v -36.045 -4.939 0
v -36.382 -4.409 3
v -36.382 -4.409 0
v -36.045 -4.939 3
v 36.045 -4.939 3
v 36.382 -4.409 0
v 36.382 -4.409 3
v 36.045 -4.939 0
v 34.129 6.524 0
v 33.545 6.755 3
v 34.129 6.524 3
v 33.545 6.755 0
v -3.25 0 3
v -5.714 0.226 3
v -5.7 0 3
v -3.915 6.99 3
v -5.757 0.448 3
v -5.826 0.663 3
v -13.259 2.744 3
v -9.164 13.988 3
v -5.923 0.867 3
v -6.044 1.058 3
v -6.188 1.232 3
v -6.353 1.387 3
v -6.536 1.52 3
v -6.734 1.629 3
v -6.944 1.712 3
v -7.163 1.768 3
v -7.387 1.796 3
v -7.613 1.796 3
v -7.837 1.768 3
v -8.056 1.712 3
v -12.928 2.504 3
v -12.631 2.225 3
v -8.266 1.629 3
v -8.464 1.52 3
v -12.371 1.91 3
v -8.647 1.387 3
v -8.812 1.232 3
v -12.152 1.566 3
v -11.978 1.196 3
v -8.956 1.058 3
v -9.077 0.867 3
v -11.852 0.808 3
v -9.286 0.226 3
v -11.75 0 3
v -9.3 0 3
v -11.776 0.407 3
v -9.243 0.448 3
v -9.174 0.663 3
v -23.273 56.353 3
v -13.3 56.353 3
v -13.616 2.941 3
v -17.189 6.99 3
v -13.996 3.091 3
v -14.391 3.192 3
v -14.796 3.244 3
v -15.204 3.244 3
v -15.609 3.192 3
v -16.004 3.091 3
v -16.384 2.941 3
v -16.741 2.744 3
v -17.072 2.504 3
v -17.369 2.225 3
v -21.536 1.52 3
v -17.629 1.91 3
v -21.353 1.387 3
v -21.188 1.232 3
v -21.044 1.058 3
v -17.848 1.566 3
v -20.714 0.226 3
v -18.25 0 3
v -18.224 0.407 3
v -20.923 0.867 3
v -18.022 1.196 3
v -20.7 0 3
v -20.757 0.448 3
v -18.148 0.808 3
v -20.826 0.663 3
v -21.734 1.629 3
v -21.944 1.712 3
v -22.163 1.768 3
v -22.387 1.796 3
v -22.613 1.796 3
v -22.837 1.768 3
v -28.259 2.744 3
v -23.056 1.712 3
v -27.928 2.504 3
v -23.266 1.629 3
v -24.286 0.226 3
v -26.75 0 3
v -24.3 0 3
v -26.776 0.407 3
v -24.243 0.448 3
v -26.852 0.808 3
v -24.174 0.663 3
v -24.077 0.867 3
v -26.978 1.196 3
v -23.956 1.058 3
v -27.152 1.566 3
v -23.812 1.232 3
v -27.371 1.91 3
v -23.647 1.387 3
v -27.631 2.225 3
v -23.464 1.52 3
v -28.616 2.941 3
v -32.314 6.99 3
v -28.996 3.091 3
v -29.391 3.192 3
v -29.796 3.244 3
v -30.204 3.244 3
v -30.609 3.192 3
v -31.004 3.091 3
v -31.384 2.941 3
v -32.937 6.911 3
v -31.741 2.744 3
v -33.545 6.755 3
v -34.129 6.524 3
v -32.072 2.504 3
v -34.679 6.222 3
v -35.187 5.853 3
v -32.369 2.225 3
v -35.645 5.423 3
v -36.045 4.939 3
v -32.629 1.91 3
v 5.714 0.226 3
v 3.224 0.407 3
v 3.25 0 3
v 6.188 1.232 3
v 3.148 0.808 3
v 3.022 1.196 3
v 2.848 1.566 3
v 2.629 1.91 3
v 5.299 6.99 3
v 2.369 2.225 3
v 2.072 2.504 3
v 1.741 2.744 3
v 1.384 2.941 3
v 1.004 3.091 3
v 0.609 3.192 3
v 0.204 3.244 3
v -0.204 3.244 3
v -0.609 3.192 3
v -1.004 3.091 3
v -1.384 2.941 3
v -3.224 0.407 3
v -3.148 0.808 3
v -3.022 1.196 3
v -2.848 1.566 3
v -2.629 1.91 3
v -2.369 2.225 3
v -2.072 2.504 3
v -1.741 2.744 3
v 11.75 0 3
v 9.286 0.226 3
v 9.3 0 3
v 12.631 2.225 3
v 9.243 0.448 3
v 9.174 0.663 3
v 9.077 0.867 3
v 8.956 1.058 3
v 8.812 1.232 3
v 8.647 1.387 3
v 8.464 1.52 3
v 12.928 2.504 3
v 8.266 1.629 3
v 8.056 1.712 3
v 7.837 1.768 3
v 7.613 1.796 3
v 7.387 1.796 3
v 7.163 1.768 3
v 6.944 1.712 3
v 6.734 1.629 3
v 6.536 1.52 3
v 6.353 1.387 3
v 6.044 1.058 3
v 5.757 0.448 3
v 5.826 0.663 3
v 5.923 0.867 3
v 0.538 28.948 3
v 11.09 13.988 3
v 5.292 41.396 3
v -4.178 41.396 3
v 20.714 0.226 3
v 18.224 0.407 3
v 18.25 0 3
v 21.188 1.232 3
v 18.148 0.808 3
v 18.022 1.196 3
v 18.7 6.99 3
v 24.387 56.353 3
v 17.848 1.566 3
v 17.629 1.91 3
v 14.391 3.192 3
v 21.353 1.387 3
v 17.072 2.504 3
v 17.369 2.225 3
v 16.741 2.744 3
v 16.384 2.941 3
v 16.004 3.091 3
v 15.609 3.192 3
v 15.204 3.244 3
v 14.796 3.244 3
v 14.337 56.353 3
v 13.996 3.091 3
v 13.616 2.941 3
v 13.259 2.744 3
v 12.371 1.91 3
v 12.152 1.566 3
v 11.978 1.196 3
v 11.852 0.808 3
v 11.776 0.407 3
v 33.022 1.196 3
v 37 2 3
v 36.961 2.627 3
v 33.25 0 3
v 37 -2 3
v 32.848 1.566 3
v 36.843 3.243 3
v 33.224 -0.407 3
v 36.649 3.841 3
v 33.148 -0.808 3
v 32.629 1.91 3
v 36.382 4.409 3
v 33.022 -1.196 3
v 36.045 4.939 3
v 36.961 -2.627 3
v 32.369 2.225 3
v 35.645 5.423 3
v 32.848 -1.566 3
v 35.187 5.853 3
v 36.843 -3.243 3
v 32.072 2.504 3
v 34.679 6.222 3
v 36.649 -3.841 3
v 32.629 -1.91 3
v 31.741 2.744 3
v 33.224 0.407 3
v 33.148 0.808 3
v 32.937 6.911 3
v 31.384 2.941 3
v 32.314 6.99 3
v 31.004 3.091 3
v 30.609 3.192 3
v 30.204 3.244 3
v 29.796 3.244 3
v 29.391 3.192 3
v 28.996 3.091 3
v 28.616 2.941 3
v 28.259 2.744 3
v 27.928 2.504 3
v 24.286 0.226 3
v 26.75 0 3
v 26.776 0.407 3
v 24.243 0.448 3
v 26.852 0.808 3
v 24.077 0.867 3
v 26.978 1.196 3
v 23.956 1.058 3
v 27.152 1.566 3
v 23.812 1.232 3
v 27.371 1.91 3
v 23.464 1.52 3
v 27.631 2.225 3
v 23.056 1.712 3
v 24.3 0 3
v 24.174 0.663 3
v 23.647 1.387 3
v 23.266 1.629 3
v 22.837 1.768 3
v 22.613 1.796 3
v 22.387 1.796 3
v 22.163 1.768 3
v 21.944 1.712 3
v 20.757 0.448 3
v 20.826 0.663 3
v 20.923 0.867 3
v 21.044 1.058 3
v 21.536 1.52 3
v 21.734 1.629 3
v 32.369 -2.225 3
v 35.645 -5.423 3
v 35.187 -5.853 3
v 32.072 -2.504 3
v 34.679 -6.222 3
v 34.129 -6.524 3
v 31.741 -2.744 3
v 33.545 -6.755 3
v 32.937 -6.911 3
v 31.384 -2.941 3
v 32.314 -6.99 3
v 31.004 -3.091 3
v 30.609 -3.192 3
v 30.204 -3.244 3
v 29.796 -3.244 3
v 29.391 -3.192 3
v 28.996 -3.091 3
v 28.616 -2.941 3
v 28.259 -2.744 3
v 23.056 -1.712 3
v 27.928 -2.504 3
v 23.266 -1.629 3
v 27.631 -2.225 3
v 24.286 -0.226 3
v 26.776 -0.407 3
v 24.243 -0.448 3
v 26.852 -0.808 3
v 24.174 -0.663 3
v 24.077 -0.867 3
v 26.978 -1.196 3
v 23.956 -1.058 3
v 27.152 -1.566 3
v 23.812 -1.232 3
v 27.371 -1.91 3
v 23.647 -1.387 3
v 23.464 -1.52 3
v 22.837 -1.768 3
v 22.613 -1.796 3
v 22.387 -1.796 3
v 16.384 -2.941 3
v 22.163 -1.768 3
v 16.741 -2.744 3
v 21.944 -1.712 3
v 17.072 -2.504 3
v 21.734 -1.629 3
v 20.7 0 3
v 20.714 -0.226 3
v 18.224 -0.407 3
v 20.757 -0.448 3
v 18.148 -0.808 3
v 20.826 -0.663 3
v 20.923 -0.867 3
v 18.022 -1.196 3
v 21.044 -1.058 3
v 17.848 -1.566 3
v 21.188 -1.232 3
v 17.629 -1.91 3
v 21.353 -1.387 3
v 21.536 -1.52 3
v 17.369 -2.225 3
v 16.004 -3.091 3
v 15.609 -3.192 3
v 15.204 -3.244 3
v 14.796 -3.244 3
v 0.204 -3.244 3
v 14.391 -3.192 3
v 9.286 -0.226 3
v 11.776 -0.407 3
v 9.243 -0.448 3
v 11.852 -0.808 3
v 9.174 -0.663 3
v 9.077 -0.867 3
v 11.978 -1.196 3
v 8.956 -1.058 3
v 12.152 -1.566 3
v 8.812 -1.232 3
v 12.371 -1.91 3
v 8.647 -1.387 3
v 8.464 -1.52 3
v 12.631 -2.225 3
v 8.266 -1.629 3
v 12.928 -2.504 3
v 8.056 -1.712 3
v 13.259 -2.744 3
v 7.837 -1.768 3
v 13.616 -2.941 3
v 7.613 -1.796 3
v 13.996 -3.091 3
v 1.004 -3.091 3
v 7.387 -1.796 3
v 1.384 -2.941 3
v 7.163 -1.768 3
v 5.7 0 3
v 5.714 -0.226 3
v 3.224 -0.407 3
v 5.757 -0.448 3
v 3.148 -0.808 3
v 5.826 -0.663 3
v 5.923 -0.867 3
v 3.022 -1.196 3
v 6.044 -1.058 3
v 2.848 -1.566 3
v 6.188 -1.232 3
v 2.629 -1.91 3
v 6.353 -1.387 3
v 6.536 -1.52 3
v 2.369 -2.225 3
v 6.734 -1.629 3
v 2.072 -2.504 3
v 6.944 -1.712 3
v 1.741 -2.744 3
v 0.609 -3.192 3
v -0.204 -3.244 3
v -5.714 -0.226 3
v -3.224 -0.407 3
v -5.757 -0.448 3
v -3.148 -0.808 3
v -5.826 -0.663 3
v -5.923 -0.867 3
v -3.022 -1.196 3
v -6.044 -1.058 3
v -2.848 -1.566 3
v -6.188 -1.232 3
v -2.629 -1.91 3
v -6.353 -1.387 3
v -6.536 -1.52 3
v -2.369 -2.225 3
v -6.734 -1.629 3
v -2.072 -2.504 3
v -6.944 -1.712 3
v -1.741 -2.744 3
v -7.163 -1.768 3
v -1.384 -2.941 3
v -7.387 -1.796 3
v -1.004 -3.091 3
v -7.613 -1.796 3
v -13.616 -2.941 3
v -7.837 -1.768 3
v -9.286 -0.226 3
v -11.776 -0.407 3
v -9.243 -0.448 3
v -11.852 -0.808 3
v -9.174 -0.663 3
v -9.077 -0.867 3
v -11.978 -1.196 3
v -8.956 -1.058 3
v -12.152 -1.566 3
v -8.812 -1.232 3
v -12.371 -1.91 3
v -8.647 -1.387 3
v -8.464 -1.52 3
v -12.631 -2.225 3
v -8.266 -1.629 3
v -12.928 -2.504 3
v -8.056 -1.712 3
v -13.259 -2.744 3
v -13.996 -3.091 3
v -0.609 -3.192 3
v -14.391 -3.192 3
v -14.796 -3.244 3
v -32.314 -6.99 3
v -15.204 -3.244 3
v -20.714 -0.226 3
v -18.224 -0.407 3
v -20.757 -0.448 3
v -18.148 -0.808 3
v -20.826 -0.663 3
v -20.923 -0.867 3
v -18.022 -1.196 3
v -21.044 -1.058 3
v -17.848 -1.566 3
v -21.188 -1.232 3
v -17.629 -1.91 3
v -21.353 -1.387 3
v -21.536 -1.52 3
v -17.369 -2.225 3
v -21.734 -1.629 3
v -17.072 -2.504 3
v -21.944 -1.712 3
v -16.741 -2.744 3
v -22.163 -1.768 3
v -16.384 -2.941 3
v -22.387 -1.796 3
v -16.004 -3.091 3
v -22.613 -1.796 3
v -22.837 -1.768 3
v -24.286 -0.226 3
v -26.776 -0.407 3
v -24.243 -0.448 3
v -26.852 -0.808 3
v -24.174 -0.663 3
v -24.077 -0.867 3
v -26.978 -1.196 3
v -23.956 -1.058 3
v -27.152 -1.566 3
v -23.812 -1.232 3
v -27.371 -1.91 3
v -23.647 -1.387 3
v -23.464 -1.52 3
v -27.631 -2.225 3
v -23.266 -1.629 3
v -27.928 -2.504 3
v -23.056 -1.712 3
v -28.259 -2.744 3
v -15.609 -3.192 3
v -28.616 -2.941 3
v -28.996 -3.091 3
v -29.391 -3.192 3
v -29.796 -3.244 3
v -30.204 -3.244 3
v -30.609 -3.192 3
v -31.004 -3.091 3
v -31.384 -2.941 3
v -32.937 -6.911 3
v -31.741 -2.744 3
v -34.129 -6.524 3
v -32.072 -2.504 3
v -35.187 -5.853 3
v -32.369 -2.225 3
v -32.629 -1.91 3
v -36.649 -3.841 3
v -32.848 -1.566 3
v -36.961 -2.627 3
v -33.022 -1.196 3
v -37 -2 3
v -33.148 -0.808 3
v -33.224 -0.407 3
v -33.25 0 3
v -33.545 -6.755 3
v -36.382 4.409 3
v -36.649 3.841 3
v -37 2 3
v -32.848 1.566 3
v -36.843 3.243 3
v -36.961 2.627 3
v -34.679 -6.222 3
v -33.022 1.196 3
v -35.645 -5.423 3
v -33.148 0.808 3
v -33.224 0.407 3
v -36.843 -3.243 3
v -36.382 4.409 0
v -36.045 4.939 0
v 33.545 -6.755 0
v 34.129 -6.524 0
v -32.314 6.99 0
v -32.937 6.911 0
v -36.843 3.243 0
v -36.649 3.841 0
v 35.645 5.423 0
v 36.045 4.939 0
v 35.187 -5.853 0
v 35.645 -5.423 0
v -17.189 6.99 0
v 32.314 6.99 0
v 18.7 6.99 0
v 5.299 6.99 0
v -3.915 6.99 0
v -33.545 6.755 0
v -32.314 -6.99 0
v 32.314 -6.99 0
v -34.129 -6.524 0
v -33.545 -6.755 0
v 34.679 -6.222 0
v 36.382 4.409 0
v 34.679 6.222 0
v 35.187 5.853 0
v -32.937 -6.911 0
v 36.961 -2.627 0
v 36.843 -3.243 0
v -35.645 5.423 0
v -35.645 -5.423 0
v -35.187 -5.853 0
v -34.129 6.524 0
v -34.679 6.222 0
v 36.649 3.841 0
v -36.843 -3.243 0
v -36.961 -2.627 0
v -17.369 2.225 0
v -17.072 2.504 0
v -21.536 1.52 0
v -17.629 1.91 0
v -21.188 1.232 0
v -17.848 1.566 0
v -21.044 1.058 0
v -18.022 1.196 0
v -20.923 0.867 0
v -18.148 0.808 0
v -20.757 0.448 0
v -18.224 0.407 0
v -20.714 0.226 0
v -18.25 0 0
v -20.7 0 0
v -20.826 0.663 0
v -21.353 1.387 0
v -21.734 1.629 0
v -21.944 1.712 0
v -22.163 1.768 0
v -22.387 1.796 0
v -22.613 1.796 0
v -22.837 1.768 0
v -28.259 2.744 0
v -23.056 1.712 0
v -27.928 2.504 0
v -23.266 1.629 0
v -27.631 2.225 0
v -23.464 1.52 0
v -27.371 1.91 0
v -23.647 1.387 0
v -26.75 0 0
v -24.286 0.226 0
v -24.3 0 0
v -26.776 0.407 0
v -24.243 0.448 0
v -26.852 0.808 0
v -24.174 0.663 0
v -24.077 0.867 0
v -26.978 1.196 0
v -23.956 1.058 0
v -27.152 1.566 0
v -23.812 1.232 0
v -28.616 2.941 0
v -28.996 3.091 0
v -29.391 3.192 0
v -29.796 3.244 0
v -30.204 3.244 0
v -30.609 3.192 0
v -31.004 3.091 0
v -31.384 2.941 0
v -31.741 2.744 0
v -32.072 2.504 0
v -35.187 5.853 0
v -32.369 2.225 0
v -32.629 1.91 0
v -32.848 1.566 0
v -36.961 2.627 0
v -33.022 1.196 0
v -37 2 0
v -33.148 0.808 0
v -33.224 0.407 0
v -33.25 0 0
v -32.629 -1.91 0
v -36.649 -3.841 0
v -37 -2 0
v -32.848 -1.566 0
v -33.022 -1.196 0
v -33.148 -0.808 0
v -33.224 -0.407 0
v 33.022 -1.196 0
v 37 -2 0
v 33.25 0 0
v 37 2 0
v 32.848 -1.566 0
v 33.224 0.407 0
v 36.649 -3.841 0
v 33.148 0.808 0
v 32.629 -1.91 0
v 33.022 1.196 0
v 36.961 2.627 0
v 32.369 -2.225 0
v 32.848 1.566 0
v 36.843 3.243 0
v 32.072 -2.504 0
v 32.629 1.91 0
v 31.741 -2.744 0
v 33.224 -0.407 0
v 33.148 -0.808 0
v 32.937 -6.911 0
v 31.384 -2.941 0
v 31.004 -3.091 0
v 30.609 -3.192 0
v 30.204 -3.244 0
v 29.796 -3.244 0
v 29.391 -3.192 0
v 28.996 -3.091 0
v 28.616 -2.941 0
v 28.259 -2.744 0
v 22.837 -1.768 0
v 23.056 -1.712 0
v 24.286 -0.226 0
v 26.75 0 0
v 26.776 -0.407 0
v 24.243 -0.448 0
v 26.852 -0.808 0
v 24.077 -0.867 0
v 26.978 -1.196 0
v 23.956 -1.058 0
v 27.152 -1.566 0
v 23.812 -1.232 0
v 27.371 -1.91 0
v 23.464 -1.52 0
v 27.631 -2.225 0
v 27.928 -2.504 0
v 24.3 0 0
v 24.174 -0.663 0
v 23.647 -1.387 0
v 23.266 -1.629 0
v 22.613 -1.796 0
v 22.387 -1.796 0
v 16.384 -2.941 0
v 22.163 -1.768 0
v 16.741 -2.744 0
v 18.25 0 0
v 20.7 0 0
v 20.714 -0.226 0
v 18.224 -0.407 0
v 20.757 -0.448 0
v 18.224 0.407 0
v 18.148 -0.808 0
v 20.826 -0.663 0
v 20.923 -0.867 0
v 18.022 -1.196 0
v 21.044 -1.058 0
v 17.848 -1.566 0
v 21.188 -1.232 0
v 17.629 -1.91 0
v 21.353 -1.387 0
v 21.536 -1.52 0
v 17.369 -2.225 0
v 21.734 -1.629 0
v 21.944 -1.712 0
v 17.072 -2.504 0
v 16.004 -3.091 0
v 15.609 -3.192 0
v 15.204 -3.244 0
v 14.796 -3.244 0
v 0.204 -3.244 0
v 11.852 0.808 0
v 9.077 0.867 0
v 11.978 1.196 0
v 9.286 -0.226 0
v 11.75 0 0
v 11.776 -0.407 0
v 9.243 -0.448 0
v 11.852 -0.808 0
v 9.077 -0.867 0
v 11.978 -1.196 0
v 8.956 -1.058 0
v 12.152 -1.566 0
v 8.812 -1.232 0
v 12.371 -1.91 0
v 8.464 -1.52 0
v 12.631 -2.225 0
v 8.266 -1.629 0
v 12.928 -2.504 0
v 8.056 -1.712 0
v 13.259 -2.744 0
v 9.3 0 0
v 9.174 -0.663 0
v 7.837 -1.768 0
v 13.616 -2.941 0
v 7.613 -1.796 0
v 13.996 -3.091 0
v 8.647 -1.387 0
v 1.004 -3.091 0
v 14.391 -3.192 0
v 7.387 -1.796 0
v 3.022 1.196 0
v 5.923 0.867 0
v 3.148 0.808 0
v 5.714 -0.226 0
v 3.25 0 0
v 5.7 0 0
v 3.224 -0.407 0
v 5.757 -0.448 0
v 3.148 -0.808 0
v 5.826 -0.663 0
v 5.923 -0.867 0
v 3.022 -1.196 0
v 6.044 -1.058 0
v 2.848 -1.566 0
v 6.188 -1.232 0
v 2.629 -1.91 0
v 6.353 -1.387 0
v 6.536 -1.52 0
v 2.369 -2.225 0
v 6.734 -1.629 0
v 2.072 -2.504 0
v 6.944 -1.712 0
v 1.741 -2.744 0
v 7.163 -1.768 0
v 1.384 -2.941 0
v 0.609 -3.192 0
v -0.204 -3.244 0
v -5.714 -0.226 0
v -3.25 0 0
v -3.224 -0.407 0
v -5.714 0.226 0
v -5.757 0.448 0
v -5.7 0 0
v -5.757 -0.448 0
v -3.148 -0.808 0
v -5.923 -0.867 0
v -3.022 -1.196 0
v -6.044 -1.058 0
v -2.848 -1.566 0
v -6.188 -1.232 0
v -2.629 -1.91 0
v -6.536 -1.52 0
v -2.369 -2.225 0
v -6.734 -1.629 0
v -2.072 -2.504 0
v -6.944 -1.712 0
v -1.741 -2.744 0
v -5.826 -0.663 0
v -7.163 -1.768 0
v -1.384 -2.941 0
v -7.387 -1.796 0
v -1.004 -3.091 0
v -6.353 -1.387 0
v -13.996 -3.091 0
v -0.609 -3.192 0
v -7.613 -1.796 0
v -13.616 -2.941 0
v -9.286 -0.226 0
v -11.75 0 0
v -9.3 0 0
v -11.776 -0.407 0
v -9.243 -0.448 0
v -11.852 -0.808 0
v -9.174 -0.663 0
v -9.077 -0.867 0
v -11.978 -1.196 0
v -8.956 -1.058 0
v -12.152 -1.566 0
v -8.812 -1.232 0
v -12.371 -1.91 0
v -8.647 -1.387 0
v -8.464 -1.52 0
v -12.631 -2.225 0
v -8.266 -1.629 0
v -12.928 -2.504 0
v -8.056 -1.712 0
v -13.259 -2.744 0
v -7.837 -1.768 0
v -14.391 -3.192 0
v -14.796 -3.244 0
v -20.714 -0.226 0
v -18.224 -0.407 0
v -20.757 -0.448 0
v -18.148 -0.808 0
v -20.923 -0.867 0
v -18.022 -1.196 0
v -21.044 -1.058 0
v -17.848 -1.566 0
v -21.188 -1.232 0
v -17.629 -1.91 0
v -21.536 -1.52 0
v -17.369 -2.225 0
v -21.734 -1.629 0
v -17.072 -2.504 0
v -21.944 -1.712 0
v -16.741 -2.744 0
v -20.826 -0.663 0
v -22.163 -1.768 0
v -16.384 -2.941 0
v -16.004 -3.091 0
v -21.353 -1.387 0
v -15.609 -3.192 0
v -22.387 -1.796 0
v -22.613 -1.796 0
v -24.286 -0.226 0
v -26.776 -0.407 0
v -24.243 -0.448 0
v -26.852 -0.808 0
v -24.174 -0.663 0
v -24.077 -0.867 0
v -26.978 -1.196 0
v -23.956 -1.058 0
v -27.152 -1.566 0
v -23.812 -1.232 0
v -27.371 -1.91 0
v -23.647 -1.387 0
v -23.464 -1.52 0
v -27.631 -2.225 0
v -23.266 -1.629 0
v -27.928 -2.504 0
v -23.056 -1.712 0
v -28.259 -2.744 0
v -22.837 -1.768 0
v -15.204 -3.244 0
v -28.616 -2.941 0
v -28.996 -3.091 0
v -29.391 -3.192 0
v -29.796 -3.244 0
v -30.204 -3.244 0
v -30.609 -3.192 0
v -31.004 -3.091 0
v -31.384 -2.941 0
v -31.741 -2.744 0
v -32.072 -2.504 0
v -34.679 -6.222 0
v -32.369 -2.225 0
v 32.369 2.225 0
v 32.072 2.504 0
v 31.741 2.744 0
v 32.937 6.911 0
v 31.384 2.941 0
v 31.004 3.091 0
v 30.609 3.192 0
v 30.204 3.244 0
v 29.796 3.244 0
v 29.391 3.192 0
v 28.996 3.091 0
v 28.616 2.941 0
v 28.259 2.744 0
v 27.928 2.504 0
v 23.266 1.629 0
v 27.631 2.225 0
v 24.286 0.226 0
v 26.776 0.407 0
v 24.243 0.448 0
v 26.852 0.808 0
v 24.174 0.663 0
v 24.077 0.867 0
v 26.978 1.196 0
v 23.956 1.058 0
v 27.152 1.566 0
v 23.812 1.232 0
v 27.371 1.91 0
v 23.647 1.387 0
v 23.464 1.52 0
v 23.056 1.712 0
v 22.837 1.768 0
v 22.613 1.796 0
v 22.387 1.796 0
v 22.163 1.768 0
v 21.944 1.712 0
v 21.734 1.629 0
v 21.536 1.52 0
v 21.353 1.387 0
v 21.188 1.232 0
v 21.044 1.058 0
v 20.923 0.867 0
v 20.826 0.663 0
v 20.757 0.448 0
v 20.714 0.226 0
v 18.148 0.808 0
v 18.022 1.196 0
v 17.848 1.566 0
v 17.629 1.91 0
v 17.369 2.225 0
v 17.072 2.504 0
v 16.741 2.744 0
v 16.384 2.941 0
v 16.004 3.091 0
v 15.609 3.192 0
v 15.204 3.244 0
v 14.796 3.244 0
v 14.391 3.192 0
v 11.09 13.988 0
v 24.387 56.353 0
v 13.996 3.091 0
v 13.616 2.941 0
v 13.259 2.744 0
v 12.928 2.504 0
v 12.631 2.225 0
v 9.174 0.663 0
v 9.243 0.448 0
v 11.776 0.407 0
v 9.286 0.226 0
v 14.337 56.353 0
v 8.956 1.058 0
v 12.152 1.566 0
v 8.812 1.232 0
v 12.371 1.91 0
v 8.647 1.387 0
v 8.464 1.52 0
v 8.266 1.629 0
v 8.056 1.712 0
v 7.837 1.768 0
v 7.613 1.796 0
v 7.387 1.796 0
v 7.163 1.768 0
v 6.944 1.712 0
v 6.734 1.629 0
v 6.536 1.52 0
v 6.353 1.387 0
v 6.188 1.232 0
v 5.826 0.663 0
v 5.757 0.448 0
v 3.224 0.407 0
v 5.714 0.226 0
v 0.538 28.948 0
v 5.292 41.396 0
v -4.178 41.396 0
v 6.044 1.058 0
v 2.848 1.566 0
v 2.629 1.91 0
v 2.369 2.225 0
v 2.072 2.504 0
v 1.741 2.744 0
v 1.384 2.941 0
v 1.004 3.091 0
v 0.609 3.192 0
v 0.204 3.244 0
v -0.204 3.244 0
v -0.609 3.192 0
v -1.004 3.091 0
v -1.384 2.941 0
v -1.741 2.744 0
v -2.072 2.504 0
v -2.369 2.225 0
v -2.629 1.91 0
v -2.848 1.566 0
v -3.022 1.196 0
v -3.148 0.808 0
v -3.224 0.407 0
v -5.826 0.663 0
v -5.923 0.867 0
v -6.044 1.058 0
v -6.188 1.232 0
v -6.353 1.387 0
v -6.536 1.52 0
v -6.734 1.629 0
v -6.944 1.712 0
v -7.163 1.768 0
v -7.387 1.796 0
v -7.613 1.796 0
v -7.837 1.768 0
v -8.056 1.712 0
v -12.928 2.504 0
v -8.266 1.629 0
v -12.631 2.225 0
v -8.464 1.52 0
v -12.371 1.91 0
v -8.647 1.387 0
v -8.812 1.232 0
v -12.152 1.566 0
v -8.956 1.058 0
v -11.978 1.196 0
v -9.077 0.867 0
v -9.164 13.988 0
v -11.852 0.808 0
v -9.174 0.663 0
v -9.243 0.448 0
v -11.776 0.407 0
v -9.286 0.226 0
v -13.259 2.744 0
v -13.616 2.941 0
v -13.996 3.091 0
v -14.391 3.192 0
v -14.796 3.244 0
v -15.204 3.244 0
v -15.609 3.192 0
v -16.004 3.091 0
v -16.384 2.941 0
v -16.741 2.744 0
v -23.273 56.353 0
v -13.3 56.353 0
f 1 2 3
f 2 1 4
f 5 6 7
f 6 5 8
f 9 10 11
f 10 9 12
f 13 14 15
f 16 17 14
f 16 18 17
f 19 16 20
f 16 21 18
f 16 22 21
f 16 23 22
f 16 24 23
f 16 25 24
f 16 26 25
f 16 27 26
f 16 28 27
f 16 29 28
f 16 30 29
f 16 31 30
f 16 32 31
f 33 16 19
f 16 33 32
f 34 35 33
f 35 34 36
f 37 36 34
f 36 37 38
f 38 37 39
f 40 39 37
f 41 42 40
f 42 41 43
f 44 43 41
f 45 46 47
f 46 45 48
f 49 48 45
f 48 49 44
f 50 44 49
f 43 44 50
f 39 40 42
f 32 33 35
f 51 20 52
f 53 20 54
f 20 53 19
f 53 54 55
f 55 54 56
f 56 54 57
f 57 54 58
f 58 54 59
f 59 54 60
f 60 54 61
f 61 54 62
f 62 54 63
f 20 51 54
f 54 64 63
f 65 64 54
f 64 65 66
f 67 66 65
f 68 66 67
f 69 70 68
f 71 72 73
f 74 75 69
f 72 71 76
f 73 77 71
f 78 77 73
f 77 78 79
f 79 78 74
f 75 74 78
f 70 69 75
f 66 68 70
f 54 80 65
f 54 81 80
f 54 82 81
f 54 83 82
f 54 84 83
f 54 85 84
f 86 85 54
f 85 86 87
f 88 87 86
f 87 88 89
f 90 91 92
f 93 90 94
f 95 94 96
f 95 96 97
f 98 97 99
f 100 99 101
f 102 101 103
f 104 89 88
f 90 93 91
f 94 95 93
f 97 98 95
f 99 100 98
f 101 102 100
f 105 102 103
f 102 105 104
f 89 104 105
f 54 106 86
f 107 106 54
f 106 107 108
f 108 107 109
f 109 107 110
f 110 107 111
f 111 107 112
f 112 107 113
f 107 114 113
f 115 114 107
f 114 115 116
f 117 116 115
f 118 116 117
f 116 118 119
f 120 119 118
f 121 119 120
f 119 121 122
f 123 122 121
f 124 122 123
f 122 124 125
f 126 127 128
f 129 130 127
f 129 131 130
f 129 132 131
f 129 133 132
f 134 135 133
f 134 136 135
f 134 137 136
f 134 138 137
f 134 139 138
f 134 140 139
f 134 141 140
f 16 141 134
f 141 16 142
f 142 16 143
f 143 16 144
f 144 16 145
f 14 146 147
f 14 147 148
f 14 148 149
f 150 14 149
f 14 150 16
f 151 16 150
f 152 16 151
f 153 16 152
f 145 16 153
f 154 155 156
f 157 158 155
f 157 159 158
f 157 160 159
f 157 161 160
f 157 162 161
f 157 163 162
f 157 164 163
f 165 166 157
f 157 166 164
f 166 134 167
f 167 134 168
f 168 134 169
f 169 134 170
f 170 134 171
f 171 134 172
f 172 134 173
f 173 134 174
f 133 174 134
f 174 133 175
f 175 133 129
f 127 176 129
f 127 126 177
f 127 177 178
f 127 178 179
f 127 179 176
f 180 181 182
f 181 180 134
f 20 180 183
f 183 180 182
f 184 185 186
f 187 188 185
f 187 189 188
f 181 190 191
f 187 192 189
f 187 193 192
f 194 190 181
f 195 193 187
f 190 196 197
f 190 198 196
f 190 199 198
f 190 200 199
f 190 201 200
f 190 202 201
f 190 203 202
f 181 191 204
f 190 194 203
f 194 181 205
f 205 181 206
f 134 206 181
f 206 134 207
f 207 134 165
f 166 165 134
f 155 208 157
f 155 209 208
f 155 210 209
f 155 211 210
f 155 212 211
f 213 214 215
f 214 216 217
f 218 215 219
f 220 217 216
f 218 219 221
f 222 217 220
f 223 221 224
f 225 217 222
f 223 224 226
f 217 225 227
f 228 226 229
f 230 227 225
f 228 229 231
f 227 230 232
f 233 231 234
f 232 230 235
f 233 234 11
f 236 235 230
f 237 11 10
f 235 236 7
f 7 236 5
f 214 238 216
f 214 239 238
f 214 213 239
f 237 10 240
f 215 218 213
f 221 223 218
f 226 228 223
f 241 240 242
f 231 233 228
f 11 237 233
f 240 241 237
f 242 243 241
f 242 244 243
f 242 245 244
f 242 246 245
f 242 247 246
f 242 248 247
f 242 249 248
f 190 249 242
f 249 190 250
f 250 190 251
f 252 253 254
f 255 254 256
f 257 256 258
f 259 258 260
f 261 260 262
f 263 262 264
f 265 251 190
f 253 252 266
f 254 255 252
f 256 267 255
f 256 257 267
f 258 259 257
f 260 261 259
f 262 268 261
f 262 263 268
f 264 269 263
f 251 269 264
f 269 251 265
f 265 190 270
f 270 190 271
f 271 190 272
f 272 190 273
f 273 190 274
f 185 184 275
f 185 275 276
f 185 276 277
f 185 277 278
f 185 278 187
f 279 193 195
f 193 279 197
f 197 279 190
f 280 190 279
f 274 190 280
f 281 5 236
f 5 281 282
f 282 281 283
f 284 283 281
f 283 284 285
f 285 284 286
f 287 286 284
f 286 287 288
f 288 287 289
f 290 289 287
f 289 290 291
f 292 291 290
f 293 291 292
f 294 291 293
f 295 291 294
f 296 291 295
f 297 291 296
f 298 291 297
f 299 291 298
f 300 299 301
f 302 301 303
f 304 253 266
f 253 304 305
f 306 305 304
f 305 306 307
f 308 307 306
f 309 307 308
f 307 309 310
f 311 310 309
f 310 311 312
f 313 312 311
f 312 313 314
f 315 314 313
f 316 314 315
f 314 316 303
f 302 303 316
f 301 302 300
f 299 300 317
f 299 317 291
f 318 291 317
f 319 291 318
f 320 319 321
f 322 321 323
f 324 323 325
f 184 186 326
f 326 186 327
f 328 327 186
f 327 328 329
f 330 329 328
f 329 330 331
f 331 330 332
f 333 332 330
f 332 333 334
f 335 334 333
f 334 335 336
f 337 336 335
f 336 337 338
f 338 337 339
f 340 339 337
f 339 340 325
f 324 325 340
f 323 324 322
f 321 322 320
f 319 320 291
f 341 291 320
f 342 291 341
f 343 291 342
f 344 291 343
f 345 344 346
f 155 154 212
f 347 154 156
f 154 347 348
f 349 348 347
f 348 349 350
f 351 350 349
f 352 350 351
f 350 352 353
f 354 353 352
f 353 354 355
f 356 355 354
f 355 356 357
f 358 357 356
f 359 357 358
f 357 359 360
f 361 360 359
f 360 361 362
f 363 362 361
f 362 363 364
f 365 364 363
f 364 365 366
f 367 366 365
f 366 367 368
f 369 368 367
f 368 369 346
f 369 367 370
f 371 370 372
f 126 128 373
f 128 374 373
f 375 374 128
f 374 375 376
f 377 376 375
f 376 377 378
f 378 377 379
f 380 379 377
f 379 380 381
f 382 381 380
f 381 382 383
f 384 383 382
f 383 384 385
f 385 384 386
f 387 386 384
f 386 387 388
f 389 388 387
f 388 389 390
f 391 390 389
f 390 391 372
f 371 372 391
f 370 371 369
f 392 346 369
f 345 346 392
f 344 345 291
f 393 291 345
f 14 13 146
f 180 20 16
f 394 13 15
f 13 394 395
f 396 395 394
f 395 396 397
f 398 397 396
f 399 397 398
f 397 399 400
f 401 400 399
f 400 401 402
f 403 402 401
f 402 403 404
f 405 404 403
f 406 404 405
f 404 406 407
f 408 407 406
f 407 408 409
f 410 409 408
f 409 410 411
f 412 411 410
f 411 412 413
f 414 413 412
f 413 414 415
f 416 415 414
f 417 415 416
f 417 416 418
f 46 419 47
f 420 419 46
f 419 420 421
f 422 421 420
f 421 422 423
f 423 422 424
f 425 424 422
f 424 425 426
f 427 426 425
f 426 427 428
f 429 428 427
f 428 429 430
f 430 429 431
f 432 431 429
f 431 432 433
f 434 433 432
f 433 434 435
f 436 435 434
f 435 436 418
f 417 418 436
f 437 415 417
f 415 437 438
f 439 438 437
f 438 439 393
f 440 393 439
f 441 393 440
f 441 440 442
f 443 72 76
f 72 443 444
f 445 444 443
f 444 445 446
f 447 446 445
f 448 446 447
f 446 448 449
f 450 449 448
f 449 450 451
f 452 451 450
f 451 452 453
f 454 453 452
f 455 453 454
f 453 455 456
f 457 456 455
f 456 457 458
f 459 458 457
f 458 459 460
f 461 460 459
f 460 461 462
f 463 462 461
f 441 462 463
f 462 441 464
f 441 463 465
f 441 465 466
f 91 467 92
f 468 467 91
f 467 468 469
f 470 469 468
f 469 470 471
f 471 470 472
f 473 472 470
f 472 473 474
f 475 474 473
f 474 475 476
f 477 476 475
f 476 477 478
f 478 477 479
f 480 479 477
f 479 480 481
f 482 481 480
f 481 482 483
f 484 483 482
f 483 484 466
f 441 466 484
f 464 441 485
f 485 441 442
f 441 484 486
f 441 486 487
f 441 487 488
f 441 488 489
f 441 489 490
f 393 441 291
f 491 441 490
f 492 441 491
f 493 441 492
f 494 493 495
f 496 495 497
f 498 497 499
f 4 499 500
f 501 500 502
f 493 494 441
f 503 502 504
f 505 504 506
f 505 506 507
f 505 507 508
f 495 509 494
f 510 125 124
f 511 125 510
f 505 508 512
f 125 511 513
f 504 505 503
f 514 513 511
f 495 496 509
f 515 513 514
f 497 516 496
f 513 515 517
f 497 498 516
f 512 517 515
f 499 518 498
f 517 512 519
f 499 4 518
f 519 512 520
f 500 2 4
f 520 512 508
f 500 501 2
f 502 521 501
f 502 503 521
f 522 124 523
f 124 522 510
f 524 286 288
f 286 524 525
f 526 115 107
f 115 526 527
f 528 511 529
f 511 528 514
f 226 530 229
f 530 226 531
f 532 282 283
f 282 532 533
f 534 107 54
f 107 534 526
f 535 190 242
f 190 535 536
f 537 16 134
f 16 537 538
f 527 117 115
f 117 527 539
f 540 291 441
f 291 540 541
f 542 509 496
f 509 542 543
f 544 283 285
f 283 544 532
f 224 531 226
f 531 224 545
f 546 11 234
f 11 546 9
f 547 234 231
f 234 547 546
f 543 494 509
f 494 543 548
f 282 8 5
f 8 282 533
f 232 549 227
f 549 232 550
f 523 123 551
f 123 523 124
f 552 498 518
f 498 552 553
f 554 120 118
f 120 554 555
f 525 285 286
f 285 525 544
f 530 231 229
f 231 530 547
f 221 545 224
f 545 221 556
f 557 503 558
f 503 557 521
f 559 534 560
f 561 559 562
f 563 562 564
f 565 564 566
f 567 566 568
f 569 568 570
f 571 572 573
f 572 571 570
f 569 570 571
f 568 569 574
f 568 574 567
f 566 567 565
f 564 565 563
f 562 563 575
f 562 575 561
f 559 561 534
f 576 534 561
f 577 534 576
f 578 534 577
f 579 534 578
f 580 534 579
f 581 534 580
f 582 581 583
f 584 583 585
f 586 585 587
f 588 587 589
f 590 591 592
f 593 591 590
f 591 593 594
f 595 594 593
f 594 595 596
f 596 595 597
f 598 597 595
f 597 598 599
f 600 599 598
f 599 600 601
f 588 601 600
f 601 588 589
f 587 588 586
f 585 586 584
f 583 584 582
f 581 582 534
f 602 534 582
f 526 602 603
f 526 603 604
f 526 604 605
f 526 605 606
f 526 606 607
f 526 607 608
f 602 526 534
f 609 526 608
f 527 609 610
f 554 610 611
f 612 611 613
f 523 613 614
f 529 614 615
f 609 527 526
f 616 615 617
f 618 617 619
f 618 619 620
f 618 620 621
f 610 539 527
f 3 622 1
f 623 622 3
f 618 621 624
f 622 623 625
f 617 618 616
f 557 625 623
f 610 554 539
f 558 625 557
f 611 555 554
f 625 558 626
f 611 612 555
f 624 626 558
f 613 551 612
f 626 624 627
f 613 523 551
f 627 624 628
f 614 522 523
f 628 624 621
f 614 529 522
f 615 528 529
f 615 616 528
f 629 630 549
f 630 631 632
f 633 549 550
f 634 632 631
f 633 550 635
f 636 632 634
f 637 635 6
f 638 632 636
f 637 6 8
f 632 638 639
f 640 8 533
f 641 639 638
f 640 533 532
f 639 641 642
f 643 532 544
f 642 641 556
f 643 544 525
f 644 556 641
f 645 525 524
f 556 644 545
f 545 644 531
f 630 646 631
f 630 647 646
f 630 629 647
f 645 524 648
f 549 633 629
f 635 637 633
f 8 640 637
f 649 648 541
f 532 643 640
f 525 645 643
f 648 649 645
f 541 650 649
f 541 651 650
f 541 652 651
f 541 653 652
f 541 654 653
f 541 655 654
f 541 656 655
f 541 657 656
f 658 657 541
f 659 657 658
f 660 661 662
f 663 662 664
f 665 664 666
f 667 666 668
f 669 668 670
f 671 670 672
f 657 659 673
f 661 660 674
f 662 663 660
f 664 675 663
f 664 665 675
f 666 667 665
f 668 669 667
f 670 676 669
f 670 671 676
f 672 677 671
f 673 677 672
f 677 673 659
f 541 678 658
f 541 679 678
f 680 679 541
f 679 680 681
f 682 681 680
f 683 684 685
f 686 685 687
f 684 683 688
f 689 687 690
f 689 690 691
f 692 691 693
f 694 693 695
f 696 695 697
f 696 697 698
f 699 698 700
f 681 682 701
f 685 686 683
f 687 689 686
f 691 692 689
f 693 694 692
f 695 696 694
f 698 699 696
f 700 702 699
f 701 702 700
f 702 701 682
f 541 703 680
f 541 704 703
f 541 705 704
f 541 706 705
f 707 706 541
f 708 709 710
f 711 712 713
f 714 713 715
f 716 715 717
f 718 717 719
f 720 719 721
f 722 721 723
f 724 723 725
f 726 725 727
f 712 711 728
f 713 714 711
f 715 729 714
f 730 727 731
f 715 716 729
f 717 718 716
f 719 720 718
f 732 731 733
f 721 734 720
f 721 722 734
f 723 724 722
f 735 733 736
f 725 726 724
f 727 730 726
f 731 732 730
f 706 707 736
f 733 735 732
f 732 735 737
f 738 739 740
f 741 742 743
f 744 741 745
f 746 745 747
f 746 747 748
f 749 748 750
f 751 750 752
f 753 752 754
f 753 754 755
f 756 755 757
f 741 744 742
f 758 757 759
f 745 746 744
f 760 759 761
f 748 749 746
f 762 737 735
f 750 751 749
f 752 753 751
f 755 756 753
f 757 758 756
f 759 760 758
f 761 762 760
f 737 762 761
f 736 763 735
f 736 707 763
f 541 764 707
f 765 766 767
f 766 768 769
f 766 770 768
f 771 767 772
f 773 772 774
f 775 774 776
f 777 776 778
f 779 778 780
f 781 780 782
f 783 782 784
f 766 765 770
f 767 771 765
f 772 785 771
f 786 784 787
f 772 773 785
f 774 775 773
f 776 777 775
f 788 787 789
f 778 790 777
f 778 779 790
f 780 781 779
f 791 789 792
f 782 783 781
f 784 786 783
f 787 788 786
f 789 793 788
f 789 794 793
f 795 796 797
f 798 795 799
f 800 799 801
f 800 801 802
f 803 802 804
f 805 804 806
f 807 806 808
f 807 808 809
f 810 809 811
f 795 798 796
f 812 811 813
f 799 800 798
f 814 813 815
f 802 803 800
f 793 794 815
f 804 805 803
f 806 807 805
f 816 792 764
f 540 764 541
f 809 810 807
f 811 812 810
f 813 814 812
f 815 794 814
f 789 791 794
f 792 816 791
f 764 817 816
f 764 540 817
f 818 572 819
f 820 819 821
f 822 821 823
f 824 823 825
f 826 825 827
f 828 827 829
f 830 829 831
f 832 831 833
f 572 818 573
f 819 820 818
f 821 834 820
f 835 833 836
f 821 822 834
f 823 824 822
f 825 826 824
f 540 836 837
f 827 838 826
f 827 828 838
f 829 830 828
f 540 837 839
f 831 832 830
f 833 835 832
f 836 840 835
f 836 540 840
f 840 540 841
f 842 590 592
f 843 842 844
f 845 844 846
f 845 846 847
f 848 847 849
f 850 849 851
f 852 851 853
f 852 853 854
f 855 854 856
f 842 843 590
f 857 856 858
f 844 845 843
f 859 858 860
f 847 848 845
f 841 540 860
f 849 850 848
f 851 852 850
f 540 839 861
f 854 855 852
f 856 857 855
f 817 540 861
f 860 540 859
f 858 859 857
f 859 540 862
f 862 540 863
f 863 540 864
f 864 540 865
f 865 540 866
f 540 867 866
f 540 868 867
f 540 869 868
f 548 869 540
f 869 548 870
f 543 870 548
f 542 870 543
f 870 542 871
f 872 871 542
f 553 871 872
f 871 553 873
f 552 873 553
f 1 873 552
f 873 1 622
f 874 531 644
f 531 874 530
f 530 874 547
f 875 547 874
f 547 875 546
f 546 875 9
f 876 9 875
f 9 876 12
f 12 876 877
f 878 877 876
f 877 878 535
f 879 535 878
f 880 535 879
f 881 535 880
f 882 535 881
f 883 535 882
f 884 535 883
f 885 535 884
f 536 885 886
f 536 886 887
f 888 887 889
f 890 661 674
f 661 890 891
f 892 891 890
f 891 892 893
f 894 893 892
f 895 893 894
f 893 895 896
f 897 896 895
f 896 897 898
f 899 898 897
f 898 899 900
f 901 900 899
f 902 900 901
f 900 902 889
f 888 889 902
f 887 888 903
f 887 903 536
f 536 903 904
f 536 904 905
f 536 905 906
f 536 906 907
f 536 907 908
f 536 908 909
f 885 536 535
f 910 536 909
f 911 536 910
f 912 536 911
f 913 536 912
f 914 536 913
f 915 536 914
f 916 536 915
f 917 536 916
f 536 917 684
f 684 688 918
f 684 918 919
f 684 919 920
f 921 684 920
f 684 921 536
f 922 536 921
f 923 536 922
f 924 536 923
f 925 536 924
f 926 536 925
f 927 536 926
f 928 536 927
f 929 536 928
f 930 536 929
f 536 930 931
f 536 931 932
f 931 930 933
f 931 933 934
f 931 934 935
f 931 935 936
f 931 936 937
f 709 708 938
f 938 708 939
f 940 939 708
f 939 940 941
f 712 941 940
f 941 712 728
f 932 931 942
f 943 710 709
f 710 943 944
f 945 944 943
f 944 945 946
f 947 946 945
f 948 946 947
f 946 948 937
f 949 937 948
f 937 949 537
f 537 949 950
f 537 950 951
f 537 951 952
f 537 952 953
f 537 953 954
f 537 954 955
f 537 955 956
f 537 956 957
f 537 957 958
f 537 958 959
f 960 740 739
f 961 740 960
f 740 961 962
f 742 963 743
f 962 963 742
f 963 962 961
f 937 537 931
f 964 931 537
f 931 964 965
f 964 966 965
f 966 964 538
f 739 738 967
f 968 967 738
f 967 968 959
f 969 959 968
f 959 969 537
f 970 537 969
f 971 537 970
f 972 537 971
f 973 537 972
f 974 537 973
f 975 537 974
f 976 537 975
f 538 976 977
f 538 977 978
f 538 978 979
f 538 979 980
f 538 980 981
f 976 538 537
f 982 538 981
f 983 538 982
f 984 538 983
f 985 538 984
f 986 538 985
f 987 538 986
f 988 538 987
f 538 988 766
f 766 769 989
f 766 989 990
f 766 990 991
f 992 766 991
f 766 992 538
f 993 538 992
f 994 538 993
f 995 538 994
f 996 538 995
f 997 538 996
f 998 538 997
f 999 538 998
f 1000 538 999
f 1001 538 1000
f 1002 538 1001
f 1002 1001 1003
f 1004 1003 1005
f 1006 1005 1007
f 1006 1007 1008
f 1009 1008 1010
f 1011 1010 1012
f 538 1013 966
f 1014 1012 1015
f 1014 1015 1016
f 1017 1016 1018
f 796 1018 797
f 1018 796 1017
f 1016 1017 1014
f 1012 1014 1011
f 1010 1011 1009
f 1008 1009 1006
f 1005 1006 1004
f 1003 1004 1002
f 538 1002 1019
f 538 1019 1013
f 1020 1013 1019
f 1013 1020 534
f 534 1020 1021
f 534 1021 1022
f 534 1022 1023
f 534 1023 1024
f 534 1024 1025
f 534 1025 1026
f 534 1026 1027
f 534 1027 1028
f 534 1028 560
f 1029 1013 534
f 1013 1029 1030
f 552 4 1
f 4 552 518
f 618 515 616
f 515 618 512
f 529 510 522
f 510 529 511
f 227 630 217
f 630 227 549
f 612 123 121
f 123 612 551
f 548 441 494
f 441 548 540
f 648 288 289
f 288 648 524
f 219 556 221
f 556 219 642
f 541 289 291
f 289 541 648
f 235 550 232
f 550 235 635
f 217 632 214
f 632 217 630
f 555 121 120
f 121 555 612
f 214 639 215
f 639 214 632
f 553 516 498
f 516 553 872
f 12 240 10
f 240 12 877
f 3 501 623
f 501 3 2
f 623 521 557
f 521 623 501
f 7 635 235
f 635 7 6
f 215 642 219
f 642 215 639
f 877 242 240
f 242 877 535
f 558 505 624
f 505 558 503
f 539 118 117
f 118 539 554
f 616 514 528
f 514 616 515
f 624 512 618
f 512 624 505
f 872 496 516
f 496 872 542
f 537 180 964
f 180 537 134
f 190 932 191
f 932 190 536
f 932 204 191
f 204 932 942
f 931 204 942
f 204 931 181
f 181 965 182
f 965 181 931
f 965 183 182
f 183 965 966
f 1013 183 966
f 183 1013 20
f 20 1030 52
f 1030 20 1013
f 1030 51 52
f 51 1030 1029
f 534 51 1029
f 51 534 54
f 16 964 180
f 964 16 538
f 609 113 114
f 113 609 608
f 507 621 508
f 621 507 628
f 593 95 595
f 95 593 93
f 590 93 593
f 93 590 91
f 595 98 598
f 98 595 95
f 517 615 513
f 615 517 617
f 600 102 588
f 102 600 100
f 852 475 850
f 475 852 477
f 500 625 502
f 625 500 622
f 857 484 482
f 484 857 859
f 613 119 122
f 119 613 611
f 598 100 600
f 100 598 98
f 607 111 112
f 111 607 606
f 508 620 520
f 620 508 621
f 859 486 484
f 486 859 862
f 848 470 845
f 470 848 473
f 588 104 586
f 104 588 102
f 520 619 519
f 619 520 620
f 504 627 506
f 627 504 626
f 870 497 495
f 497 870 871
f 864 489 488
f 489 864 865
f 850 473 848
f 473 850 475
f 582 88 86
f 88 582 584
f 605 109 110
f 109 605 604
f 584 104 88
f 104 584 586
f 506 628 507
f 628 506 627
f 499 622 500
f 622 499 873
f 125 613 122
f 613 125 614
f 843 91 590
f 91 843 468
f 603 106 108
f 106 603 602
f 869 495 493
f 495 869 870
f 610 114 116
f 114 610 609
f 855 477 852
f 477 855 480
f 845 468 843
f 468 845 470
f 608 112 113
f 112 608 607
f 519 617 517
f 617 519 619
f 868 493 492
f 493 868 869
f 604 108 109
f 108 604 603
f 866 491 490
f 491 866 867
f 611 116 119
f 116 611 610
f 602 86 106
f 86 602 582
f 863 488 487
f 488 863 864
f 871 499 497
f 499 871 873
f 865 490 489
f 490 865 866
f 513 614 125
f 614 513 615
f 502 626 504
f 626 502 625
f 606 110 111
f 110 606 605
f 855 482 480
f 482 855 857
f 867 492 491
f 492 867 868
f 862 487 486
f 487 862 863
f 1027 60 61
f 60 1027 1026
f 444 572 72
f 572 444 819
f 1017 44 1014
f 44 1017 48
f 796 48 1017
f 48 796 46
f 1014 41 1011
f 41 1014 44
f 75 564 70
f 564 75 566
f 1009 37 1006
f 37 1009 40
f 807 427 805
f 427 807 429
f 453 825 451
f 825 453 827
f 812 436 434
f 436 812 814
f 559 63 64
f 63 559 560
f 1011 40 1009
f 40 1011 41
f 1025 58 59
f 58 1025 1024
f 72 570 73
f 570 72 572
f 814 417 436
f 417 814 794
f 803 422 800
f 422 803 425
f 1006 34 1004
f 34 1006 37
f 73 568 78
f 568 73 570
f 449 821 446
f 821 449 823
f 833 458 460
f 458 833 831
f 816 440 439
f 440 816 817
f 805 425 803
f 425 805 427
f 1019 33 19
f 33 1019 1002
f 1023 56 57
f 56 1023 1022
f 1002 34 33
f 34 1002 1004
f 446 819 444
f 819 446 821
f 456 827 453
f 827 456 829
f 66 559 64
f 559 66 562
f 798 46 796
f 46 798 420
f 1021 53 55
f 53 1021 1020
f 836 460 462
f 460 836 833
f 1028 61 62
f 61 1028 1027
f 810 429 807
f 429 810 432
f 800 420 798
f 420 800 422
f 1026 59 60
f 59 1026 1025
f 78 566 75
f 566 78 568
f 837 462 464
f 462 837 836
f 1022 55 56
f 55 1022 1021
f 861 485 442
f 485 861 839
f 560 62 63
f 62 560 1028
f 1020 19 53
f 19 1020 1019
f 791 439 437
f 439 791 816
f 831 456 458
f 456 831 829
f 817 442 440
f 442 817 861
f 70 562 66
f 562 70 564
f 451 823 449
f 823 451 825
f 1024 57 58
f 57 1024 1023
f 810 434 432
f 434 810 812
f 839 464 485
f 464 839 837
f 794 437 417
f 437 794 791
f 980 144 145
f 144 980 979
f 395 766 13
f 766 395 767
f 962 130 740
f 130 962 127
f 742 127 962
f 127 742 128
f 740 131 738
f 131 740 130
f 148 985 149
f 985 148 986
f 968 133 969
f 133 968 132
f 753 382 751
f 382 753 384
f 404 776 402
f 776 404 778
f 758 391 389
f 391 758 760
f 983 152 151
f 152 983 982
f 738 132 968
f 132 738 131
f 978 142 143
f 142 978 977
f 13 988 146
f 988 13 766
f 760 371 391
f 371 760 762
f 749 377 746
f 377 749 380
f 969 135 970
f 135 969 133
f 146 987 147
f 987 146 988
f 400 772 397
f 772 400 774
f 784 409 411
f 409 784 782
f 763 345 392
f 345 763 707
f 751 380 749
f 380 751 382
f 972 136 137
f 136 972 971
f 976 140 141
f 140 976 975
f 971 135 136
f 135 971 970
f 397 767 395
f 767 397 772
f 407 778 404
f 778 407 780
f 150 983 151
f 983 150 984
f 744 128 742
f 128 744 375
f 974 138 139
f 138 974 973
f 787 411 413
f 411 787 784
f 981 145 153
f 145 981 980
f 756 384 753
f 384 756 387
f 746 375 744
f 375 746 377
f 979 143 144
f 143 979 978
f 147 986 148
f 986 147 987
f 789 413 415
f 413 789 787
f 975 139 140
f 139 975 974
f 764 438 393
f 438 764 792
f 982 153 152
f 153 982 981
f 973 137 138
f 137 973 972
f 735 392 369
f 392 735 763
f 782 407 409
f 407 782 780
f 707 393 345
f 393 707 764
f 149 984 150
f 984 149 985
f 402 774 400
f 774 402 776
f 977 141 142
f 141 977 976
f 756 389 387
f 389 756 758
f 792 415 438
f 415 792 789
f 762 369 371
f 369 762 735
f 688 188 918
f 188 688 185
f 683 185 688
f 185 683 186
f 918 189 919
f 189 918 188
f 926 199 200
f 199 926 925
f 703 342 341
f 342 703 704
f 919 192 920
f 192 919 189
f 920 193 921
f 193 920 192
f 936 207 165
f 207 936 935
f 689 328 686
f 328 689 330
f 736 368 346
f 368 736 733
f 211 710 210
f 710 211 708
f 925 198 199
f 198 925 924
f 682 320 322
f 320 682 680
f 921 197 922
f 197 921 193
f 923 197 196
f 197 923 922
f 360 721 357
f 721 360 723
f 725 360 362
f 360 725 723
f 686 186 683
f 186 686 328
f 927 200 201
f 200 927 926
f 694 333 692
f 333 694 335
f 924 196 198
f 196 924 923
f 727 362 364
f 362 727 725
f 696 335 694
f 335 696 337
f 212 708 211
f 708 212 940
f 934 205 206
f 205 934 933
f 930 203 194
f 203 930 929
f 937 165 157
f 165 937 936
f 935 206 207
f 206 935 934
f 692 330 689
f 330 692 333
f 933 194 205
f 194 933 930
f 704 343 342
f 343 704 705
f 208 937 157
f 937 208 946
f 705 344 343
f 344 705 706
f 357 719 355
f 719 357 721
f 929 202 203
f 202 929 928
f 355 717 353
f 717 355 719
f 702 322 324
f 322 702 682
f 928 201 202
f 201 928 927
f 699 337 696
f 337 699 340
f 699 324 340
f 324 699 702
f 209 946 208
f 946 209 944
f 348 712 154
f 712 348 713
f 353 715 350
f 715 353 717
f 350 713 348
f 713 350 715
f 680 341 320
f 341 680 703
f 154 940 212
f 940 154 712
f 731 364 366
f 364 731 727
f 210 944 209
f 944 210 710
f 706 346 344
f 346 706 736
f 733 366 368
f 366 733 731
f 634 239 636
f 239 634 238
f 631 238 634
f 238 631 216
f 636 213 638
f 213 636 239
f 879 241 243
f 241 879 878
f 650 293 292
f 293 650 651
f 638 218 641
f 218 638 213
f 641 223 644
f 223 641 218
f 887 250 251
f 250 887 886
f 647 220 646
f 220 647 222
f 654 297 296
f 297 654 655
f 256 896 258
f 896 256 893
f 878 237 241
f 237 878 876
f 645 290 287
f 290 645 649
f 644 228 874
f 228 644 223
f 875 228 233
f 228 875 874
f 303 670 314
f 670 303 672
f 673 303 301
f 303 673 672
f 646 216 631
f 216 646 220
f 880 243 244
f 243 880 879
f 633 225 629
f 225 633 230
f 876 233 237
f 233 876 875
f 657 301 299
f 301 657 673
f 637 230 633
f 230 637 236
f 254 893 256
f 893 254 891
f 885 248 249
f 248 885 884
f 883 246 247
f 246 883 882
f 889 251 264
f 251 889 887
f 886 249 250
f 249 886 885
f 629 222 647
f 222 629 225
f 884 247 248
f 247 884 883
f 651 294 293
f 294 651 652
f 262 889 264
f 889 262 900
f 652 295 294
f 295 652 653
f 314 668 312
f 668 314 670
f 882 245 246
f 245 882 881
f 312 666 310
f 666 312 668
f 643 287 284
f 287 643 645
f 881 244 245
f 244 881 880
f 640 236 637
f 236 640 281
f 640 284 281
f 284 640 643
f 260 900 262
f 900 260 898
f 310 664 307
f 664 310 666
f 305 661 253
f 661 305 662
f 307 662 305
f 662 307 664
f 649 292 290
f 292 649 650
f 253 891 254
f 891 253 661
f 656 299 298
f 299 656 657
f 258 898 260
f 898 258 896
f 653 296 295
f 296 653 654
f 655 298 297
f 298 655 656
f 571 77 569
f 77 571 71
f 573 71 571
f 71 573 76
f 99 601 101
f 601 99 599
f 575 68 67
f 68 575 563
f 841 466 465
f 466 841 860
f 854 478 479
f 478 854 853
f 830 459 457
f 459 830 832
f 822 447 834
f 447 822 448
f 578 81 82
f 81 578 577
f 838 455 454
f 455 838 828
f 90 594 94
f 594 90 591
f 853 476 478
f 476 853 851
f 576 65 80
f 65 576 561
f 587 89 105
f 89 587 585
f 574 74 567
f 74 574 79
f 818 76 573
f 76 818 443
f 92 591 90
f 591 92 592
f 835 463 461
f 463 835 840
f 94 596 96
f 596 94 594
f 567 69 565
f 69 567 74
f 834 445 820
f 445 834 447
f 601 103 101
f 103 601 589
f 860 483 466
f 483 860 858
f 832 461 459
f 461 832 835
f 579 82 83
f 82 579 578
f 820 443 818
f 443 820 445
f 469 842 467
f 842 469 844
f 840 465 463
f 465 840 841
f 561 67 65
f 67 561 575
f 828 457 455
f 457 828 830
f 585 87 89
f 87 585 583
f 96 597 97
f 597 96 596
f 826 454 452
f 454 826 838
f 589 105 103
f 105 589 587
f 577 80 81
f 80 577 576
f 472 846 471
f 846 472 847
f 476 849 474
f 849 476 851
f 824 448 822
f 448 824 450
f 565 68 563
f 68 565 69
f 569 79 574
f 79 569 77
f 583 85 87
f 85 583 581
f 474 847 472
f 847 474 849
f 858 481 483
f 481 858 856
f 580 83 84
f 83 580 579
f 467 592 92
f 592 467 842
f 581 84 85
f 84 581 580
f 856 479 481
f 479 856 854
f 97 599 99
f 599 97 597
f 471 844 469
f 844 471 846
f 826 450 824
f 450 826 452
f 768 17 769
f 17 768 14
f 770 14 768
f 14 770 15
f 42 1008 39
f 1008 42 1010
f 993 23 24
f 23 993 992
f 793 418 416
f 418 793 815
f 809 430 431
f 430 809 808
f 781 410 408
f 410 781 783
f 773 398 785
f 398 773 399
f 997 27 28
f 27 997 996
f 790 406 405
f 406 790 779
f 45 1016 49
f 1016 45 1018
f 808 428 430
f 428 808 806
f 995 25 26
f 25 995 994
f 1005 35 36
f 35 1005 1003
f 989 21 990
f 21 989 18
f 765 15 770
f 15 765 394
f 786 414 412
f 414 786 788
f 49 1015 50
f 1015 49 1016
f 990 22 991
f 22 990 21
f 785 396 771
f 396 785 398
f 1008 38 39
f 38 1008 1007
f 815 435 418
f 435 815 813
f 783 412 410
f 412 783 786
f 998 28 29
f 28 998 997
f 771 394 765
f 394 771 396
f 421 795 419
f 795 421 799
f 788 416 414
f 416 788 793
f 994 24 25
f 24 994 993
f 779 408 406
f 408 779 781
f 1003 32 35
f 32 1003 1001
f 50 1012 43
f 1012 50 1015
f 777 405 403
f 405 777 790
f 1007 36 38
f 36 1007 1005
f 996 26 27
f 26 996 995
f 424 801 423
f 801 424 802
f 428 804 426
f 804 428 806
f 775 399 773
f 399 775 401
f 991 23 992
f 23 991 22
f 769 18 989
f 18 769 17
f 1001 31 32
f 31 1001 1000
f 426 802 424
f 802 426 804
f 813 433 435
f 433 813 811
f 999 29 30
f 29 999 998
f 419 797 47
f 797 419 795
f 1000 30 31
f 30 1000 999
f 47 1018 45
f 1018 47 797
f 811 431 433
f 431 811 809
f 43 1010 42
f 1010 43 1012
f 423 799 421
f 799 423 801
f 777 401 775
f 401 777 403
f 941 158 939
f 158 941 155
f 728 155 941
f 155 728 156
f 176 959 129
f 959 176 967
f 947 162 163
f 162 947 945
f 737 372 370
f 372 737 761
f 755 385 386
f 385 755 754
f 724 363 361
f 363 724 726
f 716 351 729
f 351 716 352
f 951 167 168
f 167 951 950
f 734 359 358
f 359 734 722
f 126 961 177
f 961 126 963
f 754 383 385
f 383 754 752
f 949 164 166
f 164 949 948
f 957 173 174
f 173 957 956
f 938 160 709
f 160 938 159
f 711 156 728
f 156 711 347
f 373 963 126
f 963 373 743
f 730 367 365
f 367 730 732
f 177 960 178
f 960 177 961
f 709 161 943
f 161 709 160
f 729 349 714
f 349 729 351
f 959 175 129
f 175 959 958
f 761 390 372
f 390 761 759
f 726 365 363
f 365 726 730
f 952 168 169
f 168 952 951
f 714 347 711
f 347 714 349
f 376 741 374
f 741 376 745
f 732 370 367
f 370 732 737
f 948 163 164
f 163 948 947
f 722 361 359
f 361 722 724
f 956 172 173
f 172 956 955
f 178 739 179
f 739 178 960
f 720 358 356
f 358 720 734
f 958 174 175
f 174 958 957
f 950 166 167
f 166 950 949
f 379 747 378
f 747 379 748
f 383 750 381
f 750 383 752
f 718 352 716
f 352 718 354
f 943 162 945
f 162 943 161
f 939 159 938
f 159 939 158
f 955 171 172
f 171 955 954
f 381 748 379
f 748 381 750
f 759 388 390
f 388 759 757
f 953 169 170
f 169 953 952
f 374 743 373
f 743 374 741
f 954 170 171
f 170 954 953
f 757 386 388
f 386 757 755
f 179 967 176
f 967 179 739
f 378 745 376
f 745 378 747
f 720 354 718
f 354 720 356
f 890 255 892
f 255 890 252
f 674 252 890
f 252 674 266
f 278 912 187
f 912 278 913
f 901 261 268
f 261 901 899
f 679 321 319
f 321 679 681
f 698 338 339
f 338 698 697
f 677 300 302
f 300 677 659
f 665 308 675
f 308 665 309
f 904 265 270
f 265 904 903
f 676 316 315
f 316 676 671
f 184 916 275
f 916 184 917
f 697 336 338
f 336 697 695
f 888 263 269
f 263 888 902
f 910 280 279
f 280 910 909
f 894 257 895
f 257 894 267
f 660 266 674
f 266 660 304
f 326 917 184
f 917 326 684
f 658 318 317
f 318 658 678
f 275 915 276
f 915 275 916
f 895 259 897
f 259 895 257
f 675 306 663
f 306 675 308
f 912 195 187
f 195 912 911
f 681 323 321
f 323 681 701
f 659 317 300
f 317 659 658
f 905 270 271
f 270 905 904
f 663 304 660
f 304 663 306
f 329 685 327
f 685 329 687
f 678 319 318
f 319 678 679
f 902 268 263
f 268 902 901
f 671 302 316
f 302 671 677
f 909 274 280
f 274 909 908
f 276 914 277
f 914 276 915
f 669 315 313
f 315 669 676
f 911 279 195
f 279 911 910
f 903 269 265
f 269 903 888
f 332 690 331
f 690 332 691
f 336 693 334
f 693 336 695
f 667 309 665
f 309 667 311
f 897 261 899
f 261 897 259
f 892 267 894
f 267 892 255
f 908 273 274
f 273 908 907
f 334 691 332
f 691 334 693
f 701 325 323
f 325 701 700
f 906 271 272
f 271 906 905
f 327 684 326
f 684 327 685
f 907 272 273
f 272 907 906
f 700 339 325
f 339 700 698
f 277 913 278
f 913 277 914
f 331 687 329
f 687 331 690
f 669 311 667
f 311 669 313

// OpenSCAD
$fn = 50;


difference() {
	union() {
		hull() {
			translate(v = [-32.0000000000, 2.0000000000, 0]) {
				cylinder(h = 3, r = 5);
			}
			translate(v = [32.0000000000, 2.0000000000, 0]) {
				cylinder(h = 3, r = 5);
			}
			translate(v = [-32.0000000000, -2.0000000000, 0]) {
				cylinder(h = 3, r = 5);
			}
			translate(v = [32.0000000000, -2.0000000000, 0]) {
				cylinder(h = 3, r = 5);
			}
		}
		translate(v = [0, 55, 0]) {
			linear_extrude(height = 3) {
				text(font = "DejaVu Sans Mono:style=Bold", halign = "center", size = 57.0000000000, text = "W", valign = "top");
			}
		}
	}
	union() {
		translate(v = [-30.0000000000, 0.0000000000, 0]) {
			translate(v = [0, 0, -100]) {
				cylinder(h = 200, r = 3.2500000000);
			}
		}
		translate(v = [-15.0000000000, 0.0000000000, 0]) {
			translate(v = [0, 0, -100]) {
				cylinder(h = 200, r = 3.2500000000);
			}
		}
		translate(v = [0, 0, -100]) {
			cylinder(h = 200, r = 3.2500000000);
		}
		translate(v = [15.0000000000, 0.0000000000, 0]) {
			translate(v = [0, 0, -100]) {
				cylinder(h = 200, r = 3.2500000000);
			}
		}
		translate(v = [30.0000000000, 0.0000000000, 0]) {
			translate(v = [0, 0, -100]) {
				cylinder(h = 200, r = 3.2500000000);
			}
		}
		translate(v = [-30.0000000000, 0.0000000000, 0]) {
			translate(v = [0, 0, -100]) {
				cylinder(h = 200, r = 1.8000000000);
			}
		}
		translate(v = [-22.5000000000, 0.0000000000, 0]) {
			translate(v = [0, 0, -100]) {
				cylinder(h = 200, r = 1.8000000000);
			}
		}
		translate(v = [-15.0000000000, 0.0000000000, 0]) {
			translate(v = [0, 0, -100]) {
				cylinder(h = 200, r = 1.8000000000);
			}
		}
		translate(v = [-7.5000000000, 0.0000000000, 0]) {
			translate(v = [0, 0, -100]) {
				cylinder(h = 200, r = 1.8000000000);
			}
		}
		translate(v = [0, 0, -100]) {
			cylinder(h = 200, r = 1.8000000000);
		}
		translate(v = [7.5000000000, 0.0000000000, 0]) {
			translate(v = [0, 0, -100]) {
				cylinder(h = 200, r = 1.8000000000);
			}
		}
		translate(v = [15.0000000000, 0.0000000000, 0]) {
			translate(v = [0, 0, -100]) {
				cylinder(h = 200, r = 1.8000000000);
			}
		}
		translate(v = [22.5000000000, 0.0000000000, 0]) {
			translate(v = [0, 0, -100]) {
				cylinder(h = 200, r = 1.8000000000);
			}
		}
		translate(v = [30.0000000000, 0.0000000000, 0]) {
			translate(v = [0, 0, -100]) {
				cylinder(h = 200, r = 1.8000000000);
			}
		}
	}
}
